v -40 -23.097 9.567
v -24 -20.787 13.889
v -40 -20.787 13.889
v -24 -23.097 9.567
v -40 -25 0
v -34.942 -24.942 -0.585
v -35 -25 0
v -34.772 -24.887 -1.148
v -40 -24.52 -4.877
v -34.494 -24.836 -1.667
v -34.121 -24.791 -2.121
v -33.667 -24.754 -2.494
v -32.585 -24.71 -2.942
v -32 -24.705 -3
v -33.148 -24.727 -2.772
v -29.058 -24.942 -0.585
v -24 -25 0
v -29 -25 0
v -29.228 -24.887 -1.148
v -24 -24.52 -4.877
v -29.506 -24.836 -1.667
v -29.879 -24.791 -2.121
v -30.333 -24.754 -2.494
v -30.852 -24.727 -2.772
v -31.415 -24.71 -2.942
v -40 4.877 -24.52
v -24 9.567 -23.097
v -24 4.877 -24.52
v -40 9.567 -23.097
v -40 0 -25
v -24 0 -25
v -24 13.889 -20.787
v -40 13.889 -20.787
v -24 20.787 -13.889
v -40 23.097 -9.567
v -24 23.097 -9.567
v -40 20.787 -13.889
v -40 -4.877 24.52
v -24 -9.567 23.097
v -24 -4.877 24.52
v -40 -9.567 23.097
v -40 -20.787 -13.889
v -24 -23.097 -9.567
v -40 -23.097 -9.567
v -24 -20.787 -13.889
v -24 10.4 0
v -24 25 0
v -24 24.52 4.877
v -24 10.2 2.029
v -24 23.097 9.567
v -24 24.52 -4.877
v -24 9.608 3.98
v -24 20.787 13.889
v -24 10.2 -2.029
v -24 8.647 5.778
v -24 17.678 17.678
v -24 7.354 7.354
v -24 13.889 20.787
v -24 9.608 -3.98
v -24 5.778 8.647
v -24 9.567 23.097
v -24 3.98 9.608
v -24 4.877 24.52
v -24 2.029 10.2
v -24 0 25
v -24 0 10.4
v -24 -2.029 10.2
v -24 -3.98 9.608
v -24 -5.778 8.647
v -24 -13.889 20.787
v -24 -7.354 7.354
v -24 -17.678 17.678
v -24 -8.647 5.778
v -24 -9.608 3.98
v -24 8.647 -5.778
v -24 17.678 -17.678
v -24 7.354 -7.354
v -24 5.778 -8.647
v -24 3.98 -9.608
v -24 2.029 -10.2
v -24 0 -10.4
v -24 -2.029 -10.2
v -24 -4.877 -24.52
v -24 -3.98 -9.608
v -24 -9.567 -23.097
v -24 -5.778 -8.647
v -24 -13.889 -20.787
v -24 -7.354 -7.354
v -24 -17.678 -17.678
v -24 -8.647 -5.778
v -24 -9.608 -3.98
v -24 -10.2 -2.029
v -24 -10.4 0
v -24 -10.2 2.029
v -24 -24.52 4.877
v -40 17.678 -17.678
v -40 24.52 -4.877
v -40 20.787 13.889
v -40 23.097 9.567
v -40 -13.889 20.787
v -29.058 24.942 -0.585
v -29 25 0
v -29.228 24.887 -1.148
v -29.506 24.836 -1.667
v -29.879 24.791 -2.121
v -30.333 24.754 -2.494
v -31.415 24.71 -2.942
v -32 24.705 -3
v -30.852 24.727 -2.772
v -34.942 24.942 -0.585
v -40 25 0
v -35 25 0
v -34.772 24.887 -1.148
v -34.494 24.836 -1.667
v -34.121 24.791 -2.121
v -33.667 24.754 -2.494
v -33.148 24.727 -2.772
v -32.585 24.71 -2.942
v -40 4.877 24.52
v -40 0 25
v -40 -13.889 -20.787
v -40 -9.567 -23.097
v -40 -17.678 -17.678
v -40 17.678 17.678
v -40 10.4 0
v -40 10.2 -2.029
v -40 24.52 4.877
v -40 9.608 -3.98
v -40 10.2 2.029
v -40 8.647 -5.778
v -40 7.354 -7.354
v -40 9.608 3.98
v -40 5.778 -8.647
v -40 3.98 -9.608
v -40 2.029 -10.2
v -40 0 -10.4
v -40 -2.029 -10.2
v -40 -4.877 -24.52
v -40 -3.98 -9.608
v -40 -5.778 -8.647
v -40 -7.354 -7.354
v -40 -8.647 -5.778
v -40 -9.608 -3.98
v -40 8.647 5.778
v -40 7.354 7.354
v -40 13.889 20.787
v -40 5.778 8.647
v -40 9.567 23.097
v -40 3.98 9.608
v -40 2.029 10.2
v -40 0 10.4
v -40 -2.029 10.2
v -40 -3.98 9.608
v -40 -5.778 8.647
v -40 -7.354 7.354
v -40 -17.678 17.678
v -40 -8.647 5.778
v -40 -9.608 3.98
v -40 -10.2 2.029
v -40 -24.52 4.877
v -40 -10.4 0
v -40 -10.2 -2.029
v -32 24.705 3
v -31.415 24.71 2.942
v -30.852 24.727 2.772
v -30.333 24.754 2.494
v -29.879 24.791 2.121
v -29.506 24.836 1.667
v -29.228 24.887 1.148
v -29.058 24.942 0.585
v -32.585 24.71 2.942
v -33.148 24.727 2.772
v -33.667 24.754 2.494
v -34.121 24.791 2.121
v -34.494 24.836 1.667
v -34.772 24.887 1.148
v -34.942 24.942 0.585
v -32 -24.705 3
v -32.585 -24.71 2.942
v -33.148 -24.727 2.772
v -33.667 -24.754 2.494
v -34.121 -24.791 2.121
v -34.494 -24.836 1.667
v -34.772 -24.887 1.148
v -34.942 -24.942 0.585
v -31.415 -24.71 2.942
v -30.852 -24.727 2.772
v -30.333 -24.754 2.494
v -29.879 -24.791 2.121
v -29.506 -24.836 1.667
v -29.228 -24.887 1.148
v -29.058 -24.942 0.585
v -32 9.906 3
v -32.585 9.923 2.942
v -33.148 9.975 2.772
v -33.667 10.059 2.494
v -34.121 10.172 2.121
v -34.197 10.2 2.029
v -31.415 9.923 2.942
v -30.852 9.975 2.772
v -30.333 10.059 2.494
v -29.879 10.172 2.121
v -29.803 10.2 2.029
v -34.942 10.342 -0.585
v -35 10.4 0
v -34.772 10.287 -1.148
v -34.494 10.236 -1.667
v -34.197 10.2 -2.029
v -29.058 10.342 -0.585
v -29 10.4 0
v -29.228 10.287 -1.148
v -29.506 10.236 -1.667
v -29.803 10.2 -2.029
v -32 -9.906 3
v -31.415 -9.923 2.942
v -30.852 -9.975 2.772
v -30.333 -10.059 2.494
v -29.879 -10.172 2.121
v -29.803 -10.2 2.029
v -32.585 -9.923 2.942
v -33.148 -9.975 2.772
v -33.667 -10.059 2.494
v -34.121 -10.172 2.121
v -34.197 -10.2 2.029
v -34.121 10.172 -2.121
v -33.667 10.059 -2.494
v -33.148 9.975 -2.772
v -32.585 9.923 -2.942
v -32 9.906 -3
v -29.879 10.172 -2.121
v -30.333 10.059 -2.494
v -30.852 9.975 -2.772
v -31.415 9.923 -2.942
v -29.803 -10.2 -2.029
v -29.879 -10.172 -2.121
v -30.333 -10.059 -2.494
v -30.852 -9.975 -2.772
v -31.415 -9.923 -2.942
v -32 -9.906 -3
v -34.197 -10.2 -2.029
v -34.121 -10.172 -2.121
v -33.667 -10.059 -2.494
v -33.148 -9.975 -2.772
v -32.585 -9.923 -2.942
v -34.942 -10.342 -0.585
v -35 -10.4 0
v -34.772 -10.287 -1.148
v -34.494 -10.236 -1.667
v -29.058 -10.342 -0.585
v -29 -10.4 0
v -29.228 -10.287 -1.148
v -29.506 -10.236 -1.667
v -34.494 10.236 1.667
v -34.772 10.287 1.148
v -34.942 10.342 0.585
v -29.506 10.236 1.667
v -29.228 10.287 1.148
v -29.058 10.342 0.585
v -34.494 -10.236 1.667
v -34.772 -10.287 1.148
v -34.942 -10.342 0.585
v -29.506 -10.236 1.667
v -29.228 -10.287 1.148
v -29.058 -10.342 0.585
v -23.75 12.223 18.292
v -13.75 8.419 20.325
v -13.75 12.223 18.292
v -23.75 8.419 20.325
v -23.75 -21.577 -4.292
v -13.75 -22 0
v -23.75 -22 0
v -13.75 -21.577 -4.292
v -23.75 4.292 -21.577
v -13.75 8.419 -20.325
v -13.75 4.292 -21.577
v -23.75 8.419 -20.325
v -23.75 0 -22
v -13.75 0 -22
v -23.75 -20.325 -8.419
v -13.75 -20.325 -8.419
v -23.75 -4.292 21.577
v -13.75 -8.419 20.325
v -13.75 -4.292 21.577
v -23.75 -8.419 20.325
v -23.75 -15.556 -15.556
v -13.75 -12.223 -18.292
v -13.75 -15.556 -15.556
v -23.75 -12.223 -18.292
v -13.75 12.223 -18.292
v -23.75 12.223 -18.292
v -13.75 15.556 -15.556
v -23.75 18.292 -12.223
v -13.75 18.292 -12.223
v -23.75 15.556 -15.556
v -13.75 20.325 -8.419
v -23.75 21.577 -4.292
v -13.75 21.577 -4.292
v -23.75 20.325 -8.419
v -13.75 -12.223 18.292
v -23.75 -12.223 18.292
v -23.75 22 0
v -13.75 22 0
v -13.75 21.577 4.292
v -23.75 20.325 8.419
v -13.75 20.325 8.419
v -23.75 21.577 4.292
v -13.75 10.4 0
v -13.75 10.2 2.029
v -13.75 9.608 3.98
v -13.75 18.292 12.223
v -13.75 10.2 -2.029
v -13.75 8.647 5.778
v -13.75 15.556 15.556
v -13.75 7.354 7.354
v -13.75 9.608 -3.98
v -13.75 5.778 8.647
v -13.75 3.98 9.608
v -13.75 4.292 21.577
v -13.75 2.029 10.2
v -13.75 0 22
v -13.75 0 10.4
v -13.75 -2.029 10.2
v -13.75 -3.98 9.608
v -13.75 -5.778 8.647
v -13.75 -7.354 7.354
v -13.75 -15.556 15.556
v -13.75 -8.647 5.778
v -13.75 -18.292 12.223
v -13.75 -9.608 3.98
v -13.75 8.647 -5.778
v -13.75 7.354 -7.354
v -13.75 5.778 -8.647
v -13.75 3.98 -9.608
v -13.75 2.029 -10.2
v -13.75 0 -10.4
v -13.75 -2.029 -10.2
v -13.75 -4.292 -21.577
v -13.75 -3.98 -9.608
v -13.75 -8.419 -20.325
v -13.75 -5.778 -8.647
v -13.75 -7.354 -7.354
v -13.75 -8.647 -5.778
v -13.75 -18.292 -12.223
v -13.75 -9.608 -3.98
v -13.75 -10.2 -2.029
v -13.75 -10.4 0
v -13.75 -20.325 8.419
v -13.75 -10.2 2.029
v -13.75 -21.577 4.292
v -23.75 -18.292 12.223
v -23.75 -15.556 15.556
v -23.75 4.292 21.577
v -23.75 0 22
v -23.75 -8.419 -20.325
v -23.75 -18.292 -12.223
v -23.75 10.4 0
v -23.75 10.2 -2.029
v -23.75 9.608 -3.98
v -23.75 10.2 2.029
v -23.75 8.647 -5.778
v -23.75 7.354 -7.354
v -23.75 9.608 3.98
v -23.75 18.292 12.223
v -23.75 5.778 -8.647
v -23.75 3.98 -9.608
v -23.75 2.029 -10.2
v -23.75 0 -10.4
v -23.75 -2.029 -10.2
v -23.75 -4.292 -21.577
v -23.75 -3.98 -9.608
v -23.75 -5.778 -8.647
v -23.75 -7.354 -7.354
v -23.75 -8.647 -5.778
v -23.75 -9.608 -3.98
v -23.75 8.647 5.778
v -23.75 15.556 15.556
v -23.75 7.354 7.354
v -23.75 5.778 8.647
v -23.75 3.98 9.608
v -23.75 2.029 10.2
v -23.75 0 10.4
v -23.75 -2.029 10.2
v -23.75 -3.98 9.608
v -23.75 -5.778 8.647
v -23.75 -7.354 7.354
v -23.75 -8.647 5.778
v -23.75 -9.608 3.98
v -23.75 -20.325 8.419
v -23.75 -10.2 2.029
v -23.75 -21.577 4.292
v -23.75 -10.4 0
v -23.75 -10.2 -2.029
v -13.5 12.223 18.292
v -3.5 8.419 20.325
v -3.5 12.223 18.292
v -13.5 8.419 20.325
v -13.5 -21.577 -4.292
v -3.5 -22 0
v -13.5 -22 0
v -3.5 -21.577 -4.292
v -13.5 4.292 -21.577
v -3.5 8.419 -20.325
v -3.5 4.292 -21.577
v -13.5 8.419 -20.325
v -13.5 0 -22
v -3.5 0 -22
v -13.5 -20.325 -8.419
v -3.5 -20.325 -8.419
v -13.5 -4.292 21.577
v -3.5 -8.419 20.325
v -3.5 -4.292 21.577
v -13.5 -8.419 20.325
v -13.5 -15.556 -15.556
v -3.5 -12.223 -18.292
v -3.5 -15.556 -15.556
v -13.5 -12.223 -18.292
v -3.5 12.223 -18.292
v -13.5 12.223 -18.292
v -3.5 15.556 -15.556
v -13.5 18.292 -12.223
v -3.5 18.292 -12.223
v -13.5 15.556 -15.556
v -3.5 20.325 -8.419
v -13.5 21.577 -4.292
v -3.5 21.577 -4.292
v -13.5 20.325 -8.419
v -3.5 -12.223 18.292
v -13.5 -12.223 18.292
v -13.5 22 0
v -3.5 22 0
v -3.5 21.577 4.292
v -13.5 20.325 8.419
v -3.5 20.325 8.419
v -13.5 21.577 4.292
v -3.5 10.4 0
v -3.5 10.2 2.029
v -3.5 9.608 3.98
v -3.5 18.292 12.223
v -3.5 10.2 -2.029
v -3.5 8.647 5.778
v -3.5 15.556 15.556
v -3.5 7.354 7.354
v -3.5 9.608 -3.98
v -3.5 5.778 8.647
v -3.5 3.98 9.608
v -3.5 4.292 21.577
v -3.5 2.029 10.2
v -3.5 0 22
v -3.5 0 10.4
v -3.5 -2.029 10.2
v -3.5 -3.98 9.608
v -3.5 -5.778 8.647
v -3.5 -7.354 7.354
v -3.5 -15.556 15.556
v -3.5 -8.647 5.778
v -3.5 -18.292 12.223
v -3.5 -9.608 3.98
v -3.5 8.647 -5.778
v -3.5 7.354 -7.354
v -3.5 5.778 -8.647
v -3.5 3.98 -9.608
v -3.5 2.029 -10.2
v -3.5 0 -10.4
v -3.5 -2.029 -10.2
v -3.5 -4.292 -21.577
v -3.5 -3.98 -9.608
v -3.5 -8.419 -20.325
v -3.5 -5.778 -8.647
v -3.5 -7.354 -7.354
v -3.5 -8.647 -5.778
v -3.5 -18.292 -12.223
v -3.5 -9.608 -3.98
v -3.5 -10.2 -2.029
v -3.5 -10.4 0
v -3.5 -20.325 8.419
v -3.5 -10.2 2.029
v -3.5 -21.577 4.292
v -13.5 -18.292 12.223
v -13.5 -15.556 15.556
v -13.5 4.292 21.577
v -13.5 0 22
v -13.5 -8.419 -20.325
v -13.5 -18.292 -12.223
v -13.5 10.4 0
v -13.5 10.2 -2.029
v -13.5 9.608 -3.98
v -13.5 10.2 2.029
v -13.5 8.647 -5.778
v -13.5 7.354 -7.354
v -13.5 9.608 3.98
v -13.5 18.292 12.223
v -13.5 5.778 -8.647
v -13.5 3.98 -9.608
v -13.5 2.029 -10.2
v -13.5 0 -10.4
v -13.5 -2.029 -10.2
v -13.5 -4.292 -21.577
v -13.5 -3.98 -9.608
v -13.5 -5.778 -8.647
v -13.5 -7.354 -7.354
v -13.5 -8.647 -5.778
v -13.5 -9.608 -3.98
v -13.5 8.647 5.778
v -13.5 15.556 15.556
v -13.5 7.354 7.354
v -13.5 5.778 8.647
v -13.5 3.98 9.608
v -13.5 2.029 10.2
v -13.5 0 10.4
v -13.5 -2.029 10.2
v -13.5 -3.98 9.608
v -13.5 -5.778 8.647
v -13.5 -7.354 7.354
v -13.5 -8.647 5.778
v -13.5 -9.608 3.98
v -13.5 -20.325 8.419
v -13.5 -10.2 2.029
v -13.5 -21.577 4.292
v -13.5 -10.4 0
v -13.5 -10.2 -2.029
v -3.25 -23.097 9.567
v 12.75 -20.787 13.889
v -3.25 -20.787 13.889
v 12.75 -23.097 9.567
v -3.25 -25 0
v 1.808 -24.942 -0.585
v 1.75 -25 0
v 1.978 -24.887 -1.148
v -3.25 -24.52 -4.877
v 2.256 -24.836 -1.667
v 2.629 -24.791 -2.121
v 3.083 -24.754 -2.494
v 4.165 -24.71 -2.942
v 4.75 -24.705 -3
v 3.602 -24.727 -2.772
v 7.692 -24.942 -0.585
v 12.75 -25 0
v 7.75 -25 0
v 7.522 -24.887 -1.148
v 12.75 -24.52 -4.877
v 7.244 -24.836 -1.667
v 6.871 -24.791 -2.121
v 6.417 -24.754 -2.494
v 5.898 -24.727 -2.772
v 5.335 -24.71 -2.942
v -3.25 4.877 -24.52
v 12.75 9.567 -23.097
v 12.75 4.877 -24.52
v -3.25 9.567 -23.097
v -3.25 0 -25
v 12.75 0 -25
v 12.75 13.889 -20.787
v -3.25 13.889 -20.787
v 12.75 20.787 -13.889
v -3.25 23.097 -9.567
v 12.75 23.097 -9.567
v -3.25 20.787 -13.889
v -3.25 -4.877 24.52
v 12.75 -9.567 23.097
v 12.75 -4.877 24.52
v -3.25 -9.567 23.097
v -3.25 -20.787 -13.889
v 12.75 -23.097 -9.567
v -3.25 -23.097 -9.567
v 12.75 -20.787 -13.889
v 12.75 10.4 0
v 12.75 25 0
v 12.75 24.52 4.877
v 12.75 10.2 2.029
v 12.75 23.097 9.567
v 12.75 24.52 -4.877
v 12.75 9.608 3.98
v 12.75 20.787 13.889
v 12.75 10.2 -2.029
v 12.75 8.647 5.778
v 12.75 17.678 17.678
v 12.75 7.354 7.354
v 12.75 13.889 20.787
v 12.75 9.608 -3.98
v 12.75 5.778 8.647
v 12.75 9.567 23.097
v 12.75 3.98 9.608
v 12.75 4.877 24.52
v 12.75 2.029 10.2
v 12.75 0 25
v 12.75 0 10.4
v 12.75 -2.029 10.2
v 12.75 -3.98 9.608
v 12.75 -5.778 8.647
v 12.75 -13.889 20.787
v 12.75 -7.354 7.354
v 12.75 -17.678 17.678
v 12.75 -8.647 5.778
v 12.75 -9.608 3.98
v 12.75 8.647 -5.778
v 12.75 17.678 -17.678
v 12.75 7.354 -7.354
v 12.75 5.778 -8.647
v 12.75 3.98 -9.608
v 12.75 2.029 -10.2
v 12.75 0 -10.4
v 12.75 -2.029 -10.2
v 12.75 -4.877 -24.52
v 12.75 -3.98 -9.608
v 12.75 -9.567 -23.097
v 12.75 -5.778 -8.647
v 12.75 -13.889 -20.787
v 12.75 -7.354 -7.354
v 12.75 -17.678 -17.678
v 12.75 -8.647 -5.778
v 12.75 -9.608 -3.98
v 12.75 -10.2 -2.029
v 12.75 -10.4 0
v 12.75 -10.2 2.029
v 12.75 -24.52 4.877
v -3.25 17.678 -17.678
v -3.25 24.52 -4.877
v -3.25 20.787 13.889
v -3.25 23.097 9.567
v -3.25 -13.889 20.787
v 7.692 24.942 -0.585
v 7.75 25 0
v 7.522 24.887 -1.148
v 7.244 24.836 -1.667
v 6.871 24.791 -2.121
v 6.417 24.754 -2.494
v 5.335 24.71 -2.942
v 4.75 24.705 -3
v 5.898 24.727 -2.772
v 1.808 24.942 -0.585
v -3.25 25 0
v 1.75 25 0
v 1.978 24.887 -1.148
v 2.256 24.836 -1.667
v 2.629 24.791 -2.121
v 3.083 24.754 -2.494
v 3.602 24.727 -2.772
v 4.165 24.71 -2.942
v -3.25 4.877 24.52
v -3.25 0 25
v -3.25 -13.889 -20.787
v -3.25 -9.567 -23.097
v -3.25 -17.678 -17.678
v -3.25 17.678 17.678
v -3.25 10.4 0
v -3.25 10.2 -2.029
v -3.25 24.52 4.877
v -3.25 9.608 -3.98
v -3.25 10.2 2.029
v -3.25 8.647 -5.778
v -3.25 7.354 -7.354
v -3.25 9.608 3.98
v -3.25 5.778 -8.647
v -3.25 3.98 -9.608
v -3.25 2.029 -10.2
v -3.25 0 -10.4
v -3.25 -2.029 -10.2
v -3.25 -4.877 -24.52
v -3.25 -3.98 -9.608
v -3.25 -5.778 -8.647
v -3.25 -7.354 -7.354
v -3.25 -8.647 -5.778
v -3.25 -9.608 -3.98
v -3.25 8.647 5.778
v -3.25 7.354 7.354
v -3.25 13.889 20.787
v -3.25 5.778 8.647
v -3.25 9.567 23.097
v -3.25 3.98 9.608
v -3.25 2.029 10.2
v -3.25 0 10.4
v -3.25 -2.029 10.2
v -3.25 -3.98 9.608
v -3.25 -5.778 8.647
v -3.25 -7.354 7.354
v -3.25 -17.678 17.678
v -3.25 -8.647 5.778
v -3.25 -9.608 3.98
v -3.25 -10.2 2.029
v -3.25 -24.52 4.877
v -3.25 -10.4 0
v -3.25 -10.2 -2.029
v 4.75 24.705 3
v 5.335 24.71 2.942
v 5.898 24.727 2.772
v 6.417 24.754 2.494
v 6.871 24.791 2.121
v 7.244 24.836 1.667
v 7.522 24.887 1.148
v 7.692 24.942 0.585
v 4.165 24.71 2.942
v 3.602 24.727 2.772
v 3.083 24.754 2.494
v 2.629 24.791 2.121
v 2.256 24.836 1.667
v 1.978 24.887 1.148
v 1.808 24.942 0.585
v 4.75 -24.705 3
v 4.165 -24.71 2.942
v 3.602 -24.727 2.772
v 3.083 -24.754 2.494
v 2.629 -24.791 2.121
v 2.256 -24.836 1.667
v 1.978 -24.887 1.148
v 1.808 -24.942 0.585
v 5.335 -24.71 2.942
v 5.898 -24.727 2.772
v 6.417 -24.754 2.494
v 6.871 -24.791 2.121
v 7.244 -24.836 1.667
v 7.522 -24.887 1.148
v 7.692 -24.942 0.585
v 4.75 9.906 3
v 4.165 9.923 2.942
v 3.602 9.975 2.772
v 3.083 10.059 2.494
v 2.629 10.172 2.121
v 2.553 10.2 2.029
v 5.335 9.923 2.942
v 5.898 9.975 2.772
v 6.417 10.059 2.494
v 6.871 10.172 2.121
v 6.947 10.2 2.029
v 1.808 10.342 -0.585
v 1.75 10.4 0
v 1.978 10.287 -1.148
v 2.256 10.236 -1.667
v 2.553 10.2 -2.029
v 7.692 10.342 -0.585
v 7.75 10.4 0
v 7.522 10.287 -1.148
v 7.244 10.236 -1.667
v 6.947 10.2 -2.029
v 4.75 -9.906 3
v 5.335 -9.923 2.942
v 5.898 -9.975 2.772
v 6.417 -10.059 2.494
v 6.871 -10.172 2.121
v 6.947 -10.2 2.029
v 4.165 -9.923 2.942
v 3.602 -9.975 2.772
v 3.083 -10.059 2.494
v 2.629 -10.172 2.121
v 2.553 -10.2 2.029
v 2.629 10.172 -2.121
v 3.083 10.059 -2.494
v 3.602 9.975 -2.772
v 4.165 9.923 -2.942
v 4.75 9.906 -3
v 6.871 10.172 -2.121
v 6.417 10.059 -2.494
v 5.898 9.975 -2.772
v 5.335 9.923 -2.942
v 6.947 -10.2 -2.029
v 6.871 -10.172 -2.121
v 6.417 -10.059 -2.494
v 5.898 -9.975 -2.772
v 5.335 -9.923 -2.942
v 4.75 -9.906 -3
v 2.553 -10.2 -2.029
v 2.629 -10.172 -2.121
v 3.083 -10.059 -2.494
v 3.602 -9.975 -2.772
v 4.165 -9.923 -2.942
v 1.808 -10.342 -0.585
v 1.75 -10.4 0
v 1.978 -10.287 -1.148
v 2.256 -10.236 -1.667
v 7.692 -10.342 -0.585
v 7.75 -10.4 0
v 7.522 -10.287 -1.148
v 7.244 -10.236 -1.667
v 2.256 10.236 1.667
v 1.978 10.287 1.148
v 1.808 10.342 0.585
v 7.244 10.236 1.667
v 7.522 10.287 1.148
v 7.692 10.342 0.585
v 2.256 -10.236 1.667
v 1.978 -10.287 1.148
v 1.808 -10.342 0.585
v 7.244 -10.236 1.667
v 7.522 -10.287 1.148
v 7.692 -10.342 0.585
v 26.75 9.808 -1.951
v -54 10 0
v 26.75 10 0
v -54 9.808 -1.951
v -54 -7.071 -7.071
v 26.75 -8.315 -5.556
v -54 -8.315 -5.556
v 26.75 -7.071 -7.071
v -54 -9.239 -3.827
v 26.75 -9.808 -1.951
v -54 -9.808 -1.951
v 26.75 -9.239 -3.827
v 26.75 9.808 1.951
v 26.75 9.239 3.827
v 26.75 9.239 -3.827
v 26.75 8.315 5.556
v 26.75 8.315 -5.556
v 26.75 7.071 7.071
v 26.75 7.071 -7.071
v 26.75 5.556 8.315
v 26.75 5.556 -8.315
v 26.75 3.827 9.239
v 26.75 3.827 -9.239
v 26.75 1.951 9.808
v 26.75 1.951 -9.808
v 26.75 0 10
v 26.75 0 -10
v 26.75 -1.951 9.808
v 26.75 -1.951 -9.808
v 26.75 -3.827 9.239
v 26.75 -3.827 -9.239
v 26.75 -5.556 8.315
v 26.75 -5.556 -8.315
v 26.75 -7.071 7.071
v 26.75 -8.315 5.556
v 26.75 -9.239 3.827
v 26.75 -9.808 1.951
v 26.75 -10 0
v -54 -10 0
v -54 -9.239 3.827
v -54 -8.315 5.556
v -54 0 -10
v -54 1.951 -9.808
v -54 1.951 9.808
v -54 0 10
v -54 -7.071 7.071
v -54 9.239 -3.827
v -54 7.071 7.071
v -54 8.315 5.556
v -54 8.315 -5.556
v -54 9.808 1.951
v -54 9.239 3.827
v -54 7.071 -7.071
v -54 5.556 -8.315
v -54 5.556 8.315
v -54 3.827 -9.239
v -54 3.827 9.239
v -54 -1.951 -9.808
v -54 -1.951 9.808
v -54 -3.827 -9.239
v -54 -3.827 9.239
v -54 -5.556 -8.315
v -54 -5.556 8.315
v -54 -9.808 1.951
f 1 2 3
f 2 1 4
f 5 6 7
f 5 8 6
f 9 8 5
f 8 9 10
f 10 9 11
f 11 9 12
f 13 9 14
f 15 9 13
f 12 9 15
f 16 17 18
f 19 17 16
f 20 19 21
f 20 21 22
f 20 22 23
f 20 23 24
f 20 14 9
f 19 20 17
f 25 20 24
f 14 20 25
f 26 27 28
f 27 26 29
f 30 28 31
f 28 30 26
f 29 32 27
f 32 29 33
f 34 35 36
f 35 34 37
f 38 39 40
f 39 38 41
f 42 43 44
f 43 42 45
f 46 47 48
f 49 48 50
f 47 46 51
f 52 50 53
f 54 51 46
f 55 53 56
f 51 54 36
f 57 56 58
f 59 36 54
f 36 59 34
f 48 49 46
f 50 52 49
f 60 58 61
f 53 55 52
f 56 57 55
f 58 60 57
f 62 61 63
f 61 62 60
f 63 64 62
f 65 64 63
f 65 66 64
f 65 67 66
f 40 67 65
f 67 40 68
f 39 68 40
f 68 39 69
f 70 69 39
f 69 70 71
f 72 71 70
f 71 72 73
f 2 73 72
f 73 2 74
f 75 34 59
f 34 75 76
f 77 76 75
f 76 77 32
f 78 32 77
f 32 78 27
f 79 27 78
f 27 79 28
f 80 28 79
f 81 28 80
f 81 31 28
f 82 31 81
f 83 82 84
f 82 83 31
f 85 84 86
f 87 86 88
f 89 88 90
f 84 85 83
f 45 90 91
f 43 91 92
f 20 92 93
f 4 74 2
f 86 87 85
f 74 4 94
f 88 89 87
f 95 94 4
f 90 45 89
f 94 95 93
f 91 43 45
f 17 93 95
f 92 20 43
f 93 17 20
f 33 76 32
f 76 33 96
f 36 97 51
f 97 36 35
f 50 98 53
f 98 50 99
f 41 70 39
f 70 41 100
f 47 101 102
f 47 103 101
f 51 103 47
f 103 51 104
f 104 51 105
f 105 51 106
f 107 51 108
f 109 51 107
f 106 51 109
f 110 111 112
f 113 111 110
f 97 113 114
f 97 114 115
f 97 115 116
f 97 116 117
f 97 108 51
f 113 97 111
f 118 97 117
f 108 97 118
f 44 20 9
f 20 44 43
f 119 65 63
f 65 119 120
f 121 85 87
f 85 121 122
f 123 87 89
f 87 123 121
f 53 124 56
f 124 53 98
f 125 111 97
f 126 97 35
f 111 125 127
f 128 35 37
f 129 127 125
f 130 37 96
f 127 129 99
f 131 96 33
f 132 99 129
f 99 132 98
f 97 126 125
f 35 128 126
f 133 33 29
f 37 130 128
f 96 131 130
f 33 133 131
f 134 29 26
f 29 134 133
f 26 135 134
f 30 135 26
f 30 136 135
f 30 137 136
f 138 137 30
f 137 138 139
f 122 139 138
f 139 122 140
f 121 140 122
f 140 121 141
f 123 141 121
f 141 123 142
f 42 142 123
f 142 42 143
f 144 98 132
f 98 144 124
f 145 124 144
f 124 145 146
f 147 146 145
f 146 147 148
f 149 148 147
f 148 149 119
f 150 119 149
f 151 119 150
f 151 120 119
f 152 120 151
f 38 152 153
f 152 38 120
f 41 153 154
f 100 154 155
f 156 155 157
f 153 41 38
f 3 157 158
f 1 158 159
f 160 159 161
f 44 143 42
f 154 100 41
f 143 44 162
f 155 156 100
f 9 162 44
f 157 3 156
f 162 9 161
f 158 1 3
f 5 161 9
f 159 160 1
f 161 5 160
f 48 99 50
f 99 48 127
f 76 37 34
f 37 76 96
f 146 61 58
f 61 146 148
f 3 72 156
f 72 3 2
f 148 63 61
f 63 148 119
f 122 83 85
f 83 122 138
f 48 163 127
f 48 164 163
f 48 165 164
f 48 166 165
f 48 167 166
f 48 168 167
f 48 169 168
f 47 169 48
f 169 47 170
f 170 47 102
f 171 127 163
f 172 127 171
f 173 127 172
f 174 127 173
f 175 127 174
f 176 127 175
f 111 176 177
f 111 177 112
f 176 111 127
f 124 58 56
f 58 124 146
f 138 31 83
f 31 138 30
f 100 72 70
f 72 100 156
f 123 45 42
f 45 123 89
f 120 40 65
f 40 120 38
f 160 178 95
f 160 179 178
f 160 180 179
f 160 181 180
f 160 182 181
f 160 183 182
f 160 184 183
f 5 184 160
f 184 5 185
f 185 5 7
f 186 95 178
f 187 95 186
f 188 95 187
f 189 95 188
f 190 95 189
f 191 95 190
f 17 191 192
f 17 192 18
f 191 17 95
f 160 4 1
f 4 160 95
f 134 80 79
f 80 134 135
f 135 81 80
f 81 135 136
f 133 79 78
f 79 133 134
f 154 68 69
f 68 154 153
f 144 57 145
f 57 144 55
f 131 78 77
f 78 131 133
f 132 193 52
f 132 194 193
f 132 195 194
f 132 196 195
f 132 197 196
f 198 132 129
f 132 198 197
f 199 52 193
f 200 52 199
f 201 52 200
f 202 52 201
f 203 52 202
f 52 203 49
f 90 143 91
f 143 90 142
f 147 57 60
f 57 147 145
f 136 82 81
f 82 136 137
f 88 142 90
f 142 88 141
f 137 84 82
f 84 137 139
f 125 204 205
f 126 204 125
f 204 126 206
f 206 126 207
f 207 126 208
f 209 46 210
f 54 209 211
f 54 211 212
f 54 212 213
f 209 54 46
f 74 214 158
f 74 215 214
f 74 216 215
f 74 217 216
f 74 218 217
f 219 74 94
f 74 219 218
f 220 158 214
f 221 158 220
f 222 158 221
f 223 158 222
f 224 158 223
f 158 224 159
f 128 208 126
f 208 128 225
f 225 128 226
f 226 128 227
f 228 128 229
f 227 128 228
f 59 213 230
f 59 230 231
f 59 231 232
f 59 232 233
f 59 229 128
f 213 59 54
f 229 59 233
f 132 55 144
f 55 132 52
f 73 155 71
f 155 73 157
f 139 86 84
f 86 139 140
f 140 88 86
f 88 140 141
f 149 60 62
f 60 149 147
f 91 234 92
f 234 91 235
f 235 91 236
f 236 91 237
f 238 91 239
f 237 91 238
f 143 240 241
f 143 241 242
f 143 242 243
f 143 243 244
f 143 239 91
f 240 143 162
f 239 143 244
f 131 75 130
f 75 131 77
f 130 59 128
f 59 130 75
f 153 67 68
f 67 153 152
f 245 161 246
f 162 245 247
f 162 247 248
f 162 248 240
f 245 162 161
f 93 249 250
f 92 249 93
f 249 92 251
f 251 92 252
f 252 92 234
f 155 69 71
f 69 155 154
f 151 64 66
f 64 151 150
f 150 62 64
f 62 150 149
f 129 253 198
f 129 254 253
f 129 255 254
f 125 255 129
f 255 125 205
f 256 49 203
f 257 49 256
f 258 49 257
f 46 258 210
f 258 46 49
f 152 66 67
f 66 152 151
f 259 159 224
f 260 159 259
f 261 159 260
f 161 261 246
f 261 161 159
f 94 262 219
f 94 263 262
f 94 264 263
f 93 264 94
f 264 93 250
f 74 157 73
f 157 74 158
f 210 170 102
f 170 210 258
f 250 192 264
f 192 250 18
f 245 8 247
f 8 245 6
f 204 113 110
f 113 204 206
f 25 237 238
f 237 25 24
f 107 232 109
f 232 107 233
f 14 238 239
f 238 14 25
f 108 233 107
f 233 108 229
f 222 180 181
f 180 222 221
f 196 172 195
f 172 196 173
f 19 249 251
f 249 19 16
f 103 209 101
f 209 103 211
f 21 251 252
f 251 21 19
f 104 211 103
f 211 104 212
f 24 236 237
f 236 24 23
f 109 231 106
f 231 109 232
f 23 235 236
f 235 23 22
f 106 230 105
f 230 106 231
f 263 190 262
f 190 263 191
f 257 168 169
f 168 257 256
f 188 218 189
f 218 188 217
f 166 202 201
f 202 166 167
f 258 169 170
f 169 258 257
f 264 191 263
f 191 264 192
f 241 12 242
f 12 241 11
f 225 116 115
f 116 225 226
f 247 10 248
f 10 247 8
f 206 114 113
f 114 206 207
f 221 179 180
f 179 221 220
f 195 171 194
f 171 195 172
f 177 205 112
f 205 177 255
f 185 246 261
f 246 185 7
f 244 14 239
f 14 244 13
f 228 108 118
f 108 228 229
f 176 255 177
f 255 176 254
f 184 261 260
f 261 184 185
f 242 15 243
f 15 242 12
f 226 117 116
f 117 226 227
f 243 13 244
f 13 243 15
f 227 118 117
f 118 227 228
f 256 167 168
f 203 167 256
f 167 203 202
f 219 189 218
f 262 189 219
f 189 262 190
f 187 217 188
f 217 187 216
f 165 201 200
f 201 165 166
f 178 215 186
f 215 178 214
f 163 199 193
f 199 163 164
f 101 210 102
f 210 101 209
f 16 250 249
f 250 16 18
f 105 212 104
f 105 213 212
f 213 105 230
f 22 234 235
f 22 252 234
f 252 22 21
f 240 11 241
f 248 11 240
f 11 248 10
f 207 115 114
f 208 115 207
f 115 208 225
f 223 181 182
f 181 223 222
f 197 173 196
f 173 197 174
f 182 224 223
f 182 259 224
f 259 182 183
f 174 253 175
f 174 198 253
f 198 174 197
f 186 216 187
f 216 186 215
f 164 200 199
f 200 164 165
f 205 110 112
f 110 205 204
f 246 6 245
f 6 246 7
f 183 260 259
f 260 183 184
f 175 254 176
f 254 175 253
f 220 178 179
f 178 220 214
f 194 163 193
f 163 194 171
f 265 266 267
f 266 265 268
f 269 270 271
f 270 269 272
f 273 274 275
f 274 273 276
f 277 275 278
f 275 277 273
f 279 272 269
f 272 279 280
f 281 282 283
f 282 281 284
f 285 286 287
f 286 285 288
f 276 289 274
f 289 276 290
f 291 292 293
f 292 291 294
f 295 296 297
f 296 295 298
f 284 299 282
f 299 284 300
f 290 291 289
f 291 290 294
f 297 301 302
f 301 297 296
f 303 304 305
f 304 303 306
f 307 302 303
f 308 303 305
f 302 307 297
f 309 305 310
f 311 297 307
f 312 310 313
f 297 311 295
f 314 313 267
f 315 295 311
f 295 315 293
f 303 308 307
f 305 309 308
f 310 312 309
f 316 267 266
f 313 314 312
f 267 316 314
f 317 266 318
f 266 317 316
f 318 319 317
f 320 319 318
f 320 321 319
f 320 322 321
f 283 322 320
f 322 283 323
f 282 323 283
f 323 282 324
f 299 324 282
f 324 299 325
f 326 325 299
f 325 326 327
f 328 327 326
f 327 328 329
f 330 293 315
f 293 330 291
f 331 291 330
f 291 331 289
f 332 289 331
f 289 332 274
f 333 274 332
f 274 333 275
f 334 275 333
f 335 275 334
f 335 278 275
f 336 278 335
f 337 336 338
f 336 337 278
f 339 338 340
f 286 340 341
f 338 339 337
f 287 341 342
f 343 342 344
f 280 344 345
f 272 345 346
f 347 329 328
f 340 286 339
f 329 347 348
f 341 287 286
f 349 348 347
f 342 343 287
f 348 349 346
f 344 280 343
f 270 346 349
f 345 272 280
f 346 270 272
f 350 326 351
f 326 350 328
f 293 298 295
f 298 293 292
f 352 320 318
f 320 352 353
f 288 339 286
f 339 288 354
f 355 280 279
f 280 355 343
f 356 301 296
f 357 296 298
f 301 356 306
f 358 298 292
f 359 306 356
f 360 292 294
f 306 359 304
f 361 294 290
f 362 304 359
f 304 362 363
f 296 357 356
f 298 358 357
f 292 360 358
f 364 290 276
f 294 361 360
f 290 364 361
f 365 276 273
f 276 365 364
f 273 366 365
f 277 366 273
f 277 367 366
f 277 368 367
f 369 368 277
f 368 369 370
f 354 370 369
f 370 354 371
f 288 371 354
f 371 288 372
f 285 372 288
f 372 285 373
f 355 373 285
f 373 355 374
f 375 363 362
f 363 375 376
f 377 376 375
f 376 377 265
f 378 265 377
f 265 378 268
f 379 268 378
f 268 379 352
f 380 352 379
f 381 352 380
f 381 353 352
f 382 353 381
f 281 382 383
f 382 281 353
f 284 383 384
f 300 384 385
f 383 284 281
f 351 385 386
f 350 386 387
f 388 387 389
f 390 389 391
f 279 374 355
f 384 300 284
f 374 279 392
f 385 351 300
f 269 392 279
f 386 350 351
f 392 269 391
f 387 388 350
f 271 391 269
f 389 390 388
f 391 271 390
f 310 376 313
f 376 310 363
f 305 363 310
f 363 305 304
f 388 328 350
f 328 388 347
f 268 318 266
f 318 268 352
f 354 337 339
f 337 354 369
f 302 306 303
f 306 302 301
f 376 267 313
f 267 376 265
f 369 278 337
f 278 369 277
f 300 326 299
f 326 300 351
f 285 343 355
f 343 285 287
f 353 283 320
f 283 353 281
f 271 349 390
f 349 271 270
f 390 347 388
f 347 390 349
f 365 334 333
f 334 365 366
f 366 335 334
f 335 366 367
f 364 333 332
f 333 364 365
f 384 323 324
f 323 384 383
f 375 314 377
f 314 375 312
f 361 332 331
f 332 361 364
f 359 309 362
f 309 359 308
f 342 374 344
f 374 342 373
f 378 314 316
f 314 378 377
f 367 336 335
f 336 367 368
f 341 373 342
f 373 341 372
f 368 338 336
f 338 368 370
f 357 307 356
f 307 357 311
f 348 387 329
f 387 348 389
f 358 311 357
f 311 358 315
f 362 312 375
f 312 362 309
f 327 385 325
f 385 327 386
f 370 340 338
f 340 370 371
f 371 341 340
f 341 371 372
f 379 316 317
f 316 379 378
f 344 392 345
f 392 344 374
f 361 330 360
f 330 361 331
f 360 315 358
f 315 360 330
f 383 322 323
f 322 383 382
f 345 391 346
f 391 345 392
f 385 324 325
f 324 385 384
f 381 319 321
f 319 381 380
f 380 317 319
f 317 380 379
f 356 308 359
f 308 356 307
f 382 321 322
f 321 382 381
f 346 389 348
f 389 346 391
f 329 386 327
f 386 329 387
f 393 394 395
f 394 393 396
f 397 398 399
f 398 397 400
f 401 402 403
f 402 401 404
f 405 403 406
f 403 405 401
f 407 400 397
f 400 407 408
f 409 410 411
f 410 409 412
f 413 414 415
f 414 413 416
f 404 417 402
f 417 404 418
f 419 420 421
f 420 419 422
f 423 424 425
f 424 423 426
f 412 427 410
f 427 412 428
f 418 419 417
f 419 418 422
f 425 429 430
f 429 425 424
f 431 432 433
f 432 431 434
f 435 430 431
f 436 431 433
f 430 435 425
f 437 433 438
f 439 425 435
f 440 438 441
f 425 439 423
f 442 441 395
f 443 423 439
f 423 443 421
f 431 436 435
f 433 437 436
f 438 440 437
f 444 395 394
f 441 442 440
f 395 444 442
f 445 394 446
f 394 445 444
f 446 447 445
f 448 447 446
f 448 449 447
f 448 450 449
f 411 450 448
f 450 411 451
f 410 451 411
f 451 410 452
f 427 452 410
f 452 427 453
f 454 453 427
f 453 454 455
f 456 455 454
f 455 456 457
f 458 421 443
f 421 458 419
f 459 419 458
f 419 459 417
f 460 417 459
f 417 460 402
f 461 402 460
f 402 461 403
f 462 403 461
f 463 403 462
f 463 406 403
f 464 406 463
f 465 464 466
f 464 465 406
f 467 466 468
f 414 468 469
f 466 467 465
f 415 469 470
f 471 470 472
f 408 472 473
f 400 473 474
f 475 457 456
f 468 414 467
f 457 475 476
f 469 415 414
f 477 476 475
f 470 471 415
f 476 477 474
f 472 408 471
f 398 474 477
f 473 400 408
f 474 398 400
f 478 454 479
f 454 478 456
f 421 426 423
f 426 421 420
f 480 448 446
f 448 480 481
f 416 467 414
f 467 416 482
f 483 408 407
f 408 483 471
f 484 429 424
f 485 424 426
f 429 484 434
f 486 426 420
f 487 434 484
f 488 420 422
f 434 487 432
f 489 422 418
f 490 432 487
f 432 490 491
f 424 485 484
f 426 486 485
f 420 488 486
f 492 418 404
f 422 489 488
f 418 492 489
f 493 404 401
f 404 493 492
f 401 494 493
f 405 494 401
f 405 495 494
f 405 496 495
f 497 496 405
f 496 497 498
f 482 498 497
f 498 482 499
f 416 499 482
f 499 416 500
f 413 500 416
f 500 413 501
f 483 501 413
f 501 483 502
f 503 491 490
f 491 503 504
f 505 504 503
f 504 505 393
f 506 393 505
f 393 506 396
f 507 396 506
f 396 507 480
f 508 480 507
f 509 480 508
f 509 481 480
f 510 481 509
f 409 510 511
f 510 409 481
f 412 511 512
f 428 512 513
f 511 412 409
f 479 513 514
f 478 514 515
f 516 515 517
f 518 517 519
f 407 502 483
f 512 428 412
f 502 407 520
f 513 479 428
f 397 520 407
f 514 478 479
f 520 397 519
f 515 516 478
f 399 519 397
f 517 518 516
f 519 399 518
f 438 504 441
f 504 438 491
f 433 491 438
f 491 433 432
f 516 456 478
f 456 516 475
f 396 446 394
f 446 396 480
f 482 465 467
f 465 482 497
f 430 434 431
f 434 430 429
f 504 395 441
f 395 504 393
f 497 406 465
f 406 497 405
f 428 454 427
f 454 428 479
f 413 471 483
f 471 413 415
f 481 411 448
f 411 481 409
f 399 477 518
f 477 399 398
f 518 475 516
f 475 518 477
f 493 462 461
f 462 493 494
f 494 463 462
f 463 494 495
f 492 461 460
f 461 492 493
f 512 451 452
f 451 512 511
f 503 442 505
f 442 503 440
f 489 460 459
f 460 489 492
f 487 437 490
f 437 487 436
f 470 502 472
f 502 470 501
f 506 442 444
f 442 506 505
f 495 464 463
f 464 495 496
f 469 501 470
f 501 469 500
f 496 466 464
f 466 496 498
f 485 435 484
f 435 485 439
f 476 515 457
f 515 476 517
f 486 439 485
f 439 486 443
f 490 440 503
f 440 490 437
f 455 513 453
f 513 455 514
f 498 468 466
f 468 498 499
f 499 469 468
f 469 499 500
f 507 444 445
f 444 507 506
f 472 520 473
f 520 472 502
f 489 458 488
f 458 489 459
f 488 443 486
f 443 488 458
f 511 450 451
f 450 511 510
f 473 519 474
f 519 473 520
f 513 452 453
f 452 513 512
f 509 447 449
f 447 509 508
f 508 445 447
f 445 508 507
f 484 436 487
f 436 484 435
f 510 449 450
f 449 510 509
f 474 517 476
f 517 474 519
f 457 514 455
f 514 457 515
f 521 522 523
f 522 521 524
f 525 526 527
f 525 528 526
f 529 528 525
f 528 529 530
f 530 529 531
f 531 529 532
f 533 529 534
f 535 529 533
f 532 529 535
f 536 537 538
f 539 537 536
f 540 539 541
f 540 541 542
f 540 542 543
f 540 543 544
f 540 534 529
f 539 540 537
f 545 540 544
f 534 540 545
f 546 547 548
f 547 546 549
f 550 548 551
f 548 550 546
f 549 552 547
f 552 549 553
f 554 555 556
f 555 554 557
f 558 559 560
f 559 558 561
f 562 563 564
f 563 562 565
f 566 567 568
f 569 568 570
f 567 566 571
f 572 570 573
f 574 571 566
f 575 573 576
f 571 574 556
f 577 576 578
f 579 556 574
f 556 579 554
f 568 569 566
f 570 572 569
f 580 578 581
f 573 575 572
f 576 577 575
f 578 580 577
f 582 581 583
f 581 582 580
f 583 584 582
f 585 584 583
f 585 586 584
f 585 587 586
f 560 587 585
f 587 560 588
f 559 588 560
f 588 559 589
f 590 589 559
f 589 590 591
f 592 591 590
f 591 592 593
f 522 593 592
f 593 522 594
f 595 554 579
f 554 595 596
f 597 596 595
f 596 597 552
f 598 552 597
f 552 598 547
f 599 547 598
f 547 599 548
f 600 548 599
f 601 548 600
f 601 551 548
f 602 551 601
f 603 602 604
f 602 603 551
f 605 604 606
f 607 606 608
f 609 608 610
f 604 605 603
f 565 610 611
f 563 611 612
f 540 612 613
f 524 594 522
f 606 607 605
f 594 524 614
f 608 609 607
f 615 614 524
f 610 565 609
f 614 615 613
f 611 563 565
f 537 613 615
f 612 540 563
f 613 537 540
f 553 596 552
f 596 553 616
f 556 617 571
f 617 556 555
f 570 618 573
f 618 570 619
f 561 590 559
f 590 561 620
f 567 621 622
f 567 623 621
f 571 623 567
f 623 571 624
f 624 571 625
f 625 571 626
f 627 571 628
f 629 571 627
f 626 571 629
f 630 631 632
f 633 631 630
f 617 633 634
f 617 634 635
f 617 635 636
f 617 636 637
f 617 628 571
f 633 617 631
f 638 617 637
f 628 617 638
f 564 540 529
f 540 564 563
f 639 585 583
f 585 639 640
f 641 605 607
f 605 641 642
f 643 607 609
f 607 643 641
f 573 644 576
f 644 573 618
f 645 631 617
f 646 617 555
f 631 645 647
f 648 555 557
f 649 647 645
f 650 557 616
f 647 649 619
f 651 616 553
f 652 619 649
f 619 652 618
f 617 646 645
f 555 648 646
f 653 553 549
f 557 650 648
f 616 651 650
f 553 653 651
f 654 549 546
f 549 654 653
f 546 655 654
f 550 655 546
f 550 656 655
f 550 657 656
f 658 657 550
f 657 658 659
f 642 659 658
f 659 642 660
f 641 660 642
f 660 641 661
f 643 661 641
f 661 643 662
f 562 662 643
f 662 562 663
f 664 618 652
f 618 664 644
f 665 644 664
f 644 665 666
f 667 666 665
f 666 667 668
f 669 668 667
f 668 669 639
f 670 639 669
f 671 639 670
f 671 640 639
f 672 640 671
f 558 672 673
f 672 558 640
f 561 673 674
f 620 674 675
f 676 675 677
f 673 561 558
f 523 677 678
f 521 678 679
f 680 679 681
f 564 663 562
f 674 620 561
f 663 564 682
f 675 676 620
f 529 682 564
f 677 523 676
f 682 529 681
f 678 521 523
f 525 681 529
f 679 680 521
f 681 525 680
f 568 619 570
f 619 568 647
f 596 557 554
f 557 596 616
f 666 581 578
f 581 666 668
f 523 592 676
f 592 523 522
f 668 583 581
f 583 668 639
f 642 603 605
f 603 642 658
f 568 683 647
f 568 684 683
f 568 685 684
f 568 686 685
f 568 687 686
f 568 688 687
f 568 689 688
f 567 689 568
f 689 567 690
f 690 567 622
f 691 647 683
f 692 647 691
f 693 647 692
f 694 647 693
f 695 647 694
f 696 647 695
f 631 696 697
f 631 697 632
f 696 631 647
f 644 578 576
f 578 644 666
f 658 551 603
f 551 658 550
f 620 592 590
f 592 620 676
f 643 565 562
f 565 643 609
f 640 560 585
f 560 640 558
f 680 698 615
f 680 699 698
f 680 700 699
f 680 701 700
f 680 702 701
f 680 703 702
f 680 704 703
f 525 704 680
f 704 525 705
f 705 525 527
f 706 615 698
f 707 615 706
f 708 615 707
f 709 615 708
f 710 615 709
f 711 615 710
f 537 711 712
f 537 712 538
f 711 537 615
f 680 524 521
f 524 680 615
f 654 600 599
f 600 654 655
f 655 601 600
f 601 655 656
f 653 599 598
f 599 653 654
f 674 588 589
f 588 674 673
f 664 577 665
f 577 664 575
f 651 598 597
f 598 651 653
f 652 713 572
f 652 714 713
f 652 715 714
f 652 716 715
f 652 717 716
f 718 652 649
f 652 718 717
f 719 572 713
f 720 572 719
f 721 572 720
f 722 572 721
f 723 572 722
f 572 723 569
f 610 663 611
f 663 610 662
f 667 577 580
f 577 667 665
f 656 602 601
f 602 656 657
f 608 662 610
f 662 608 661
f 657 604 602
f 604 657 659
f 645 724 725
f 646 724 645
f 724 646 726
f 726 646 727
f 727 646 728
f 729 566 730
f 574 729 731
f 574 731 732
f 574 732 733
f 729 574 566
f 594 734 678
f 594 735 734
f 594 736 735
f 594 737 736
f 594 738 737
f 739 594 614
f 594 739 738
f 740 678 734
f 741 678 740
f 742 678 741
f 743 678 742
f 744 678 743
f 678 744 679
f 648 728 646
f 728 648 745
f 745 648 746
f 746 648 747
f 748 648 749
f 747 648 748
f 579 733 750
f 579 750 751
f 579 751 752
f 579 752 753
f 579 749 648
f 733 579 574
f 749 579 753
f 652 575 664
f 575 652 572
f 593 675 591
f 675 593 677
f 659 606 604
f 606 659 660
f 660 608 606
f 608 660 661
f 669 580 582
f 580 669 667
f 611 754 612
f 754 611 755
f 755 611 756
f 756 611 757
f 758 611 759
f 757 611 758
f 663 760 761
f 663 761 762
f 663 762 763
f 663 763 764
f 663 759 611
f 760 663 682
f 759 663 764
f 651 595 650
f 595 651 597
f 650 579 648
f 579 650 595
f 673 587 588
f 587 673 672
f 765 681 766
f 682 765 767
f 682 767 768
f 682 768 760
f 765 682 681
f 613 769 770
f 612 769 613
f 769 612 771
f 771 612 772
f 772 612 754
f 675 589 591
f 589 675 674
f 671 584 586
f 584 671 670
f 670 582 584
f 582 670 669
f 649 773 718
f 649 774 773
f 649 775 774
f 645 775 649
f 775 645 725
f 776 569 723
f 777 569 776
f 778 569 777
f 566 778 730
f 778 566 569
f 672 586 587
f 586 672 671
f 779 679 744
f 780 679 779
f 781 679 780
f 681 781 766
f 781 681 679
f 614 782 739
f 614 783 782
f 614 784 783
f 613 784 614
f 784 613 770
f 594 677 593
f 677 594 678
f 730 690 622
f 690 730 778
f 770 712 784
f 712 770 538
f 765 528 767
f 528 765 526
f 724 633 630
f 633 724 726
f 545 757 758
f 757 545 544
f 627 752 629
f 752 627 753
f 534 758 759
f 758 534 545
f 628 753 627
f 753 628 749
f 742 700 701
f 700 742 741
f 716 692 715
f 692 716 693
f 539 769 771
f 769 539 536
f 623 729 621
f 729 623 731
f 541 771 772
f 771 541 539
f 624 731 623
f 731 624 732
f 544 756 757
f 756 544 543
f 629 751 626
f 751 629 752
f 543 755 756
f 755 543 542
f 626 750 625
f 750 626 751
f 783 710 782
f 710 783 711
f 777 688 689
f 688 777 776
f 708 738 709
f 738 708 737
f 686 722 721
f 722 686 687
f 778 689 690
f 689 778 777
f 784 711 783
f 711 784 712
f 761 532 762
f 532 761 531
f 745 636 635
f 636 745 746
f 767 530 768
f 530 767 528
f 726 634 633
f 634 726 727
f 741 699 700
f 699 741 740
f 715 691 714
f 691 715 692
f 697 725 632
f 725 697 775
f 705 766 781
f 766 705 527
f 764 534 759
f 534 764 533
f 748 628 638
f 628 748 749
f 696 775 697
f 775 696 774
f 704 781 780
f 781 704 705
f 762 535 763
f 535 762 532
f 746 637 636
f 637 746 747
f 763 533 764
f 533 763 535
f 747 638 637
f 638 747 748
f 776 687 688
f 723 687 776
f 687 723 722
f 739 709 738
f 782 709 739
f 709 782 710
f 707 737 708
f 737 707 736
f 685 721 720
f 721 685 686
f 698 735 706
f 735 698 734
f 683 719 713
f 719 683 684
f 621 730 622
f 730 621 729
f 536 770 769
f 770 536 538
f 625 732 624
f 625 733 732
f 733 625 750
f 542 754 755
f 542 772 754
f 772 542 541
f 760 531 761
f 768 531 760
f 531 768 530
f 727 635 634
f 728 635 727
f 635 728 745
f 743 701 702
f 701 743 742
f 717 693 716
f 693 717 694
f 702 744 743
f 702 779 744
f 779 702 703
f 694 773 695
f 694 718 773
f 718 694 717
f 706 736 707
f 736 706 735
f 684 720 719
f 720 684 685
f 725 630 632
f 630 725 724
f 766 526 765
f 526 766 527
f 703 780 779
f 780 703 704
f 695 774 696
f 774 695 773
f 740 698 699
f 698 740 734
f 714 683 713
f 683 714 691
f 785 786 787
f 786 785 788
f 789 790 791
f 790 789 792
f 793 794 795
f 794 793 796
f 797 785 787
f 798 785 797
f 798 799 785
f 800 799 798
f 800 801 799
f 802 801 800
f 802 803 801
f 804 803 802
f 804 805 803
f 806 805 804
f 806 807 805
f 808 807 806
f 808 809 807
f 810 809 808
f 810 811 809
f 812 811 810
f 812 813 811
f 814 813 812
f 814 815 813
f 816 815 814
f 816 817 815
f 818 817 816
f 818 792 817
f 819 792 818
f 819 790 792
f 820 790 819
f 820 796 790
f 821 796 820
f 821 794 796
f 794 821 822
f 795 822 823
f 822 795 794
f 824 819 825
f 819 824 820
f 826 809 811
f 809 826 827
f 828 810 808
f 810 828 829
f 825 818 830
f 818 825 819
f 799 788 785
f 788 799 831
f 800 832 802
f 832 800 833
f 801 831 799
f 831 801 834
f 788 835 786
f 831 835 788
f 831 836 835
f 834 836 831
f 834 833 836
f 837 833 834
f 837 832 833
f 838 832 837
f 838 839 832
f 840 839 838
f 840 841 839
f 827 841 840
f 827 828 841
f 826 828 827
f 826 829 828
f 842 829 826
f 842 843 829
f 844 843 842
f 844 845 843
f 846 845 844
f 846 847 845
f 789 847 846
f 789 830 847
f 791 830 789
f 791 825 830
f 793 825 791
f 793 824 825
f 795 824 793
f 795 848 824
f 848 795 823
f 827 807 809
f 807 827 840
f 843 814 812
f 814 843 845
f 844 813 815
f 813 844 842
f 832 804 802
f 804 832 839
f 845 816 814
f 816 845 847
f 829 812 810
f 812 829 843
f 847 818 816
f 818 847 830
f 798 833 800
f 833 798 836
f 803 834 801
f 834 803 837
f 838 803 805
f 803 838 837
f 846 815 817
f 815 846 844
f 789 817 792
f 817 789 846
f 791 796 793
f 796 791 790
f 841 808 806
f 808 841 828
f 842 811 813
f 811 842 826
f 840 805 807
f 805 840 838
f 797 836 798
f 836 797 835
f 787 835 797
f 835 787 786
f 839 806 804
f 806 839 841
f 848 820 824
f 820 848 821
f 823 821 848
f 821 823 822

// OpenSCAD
$fn = 32;

// ------------------------------------------------------------------------
// Shaft with rings and collars: d20 shaft, 4 rings
// Every part is its own module, assembly() places them once.
// ------------------------------------------------------------------------

// --- part 1 ---
module shaft() {
  translate([0, 0, -40.375]) cylinder(h = 80.75, d = 20);
}

// --- part 2 ---
module collar_a() {
  difference() {
    cylinder(h = 16, d = 50);
    translate([0, 0, -1]) cylinder(h = 18, d = 20.8);
    translate([0, 0, 8]) rotate([90, 0, 0]) cylinder(h = 52, d = 6, center = true);
  }
}

// --- part 3 ---
module spacer_a() {
  difference() {
      translate([0, 0, 0]) cylinder(h = 10, d = 44);
      translate([0, 0, -1]) cylinder(h = 12, d = 20.8);
    }
}

// --- part 4 ---
module spacer_b() {
  difference() {
      translate([0, 0, 0]) cylinder(h = 10, d = 44);
      translate([0, 0, -1]) cylinder(h = 12, d = 20.8);
    }
}

// --- part 5 ---
module collar_b() {
  difference() {
    cylinder(h = 16, d = 50);
    translate([0, 0, -1]) cylinder(h = 18, d = 20.8);
    translate([0, 0, 8]) rotate([90, 0, 0]) cylinder(h = 52, d = 6, center = true);
  }
}

// --- assembly ---
module assembly() {
  translate([-13.625, 0, 0]) rotate([0, 90, 0]) shaft();
  translate([-40, 0, 0]) rotate([0, 90, 0]) collar_a();
  translate([-23.75, 0, 0]) rotate([0, 90, 0]) spacer_a();
  translate([-13.5, 0, 0]) rotate([0, 90, 0]) spacer_b();
  translate([-3.25, 0, 0]) rotate([0, 90, 0]) collar_b();
}

assembly();
